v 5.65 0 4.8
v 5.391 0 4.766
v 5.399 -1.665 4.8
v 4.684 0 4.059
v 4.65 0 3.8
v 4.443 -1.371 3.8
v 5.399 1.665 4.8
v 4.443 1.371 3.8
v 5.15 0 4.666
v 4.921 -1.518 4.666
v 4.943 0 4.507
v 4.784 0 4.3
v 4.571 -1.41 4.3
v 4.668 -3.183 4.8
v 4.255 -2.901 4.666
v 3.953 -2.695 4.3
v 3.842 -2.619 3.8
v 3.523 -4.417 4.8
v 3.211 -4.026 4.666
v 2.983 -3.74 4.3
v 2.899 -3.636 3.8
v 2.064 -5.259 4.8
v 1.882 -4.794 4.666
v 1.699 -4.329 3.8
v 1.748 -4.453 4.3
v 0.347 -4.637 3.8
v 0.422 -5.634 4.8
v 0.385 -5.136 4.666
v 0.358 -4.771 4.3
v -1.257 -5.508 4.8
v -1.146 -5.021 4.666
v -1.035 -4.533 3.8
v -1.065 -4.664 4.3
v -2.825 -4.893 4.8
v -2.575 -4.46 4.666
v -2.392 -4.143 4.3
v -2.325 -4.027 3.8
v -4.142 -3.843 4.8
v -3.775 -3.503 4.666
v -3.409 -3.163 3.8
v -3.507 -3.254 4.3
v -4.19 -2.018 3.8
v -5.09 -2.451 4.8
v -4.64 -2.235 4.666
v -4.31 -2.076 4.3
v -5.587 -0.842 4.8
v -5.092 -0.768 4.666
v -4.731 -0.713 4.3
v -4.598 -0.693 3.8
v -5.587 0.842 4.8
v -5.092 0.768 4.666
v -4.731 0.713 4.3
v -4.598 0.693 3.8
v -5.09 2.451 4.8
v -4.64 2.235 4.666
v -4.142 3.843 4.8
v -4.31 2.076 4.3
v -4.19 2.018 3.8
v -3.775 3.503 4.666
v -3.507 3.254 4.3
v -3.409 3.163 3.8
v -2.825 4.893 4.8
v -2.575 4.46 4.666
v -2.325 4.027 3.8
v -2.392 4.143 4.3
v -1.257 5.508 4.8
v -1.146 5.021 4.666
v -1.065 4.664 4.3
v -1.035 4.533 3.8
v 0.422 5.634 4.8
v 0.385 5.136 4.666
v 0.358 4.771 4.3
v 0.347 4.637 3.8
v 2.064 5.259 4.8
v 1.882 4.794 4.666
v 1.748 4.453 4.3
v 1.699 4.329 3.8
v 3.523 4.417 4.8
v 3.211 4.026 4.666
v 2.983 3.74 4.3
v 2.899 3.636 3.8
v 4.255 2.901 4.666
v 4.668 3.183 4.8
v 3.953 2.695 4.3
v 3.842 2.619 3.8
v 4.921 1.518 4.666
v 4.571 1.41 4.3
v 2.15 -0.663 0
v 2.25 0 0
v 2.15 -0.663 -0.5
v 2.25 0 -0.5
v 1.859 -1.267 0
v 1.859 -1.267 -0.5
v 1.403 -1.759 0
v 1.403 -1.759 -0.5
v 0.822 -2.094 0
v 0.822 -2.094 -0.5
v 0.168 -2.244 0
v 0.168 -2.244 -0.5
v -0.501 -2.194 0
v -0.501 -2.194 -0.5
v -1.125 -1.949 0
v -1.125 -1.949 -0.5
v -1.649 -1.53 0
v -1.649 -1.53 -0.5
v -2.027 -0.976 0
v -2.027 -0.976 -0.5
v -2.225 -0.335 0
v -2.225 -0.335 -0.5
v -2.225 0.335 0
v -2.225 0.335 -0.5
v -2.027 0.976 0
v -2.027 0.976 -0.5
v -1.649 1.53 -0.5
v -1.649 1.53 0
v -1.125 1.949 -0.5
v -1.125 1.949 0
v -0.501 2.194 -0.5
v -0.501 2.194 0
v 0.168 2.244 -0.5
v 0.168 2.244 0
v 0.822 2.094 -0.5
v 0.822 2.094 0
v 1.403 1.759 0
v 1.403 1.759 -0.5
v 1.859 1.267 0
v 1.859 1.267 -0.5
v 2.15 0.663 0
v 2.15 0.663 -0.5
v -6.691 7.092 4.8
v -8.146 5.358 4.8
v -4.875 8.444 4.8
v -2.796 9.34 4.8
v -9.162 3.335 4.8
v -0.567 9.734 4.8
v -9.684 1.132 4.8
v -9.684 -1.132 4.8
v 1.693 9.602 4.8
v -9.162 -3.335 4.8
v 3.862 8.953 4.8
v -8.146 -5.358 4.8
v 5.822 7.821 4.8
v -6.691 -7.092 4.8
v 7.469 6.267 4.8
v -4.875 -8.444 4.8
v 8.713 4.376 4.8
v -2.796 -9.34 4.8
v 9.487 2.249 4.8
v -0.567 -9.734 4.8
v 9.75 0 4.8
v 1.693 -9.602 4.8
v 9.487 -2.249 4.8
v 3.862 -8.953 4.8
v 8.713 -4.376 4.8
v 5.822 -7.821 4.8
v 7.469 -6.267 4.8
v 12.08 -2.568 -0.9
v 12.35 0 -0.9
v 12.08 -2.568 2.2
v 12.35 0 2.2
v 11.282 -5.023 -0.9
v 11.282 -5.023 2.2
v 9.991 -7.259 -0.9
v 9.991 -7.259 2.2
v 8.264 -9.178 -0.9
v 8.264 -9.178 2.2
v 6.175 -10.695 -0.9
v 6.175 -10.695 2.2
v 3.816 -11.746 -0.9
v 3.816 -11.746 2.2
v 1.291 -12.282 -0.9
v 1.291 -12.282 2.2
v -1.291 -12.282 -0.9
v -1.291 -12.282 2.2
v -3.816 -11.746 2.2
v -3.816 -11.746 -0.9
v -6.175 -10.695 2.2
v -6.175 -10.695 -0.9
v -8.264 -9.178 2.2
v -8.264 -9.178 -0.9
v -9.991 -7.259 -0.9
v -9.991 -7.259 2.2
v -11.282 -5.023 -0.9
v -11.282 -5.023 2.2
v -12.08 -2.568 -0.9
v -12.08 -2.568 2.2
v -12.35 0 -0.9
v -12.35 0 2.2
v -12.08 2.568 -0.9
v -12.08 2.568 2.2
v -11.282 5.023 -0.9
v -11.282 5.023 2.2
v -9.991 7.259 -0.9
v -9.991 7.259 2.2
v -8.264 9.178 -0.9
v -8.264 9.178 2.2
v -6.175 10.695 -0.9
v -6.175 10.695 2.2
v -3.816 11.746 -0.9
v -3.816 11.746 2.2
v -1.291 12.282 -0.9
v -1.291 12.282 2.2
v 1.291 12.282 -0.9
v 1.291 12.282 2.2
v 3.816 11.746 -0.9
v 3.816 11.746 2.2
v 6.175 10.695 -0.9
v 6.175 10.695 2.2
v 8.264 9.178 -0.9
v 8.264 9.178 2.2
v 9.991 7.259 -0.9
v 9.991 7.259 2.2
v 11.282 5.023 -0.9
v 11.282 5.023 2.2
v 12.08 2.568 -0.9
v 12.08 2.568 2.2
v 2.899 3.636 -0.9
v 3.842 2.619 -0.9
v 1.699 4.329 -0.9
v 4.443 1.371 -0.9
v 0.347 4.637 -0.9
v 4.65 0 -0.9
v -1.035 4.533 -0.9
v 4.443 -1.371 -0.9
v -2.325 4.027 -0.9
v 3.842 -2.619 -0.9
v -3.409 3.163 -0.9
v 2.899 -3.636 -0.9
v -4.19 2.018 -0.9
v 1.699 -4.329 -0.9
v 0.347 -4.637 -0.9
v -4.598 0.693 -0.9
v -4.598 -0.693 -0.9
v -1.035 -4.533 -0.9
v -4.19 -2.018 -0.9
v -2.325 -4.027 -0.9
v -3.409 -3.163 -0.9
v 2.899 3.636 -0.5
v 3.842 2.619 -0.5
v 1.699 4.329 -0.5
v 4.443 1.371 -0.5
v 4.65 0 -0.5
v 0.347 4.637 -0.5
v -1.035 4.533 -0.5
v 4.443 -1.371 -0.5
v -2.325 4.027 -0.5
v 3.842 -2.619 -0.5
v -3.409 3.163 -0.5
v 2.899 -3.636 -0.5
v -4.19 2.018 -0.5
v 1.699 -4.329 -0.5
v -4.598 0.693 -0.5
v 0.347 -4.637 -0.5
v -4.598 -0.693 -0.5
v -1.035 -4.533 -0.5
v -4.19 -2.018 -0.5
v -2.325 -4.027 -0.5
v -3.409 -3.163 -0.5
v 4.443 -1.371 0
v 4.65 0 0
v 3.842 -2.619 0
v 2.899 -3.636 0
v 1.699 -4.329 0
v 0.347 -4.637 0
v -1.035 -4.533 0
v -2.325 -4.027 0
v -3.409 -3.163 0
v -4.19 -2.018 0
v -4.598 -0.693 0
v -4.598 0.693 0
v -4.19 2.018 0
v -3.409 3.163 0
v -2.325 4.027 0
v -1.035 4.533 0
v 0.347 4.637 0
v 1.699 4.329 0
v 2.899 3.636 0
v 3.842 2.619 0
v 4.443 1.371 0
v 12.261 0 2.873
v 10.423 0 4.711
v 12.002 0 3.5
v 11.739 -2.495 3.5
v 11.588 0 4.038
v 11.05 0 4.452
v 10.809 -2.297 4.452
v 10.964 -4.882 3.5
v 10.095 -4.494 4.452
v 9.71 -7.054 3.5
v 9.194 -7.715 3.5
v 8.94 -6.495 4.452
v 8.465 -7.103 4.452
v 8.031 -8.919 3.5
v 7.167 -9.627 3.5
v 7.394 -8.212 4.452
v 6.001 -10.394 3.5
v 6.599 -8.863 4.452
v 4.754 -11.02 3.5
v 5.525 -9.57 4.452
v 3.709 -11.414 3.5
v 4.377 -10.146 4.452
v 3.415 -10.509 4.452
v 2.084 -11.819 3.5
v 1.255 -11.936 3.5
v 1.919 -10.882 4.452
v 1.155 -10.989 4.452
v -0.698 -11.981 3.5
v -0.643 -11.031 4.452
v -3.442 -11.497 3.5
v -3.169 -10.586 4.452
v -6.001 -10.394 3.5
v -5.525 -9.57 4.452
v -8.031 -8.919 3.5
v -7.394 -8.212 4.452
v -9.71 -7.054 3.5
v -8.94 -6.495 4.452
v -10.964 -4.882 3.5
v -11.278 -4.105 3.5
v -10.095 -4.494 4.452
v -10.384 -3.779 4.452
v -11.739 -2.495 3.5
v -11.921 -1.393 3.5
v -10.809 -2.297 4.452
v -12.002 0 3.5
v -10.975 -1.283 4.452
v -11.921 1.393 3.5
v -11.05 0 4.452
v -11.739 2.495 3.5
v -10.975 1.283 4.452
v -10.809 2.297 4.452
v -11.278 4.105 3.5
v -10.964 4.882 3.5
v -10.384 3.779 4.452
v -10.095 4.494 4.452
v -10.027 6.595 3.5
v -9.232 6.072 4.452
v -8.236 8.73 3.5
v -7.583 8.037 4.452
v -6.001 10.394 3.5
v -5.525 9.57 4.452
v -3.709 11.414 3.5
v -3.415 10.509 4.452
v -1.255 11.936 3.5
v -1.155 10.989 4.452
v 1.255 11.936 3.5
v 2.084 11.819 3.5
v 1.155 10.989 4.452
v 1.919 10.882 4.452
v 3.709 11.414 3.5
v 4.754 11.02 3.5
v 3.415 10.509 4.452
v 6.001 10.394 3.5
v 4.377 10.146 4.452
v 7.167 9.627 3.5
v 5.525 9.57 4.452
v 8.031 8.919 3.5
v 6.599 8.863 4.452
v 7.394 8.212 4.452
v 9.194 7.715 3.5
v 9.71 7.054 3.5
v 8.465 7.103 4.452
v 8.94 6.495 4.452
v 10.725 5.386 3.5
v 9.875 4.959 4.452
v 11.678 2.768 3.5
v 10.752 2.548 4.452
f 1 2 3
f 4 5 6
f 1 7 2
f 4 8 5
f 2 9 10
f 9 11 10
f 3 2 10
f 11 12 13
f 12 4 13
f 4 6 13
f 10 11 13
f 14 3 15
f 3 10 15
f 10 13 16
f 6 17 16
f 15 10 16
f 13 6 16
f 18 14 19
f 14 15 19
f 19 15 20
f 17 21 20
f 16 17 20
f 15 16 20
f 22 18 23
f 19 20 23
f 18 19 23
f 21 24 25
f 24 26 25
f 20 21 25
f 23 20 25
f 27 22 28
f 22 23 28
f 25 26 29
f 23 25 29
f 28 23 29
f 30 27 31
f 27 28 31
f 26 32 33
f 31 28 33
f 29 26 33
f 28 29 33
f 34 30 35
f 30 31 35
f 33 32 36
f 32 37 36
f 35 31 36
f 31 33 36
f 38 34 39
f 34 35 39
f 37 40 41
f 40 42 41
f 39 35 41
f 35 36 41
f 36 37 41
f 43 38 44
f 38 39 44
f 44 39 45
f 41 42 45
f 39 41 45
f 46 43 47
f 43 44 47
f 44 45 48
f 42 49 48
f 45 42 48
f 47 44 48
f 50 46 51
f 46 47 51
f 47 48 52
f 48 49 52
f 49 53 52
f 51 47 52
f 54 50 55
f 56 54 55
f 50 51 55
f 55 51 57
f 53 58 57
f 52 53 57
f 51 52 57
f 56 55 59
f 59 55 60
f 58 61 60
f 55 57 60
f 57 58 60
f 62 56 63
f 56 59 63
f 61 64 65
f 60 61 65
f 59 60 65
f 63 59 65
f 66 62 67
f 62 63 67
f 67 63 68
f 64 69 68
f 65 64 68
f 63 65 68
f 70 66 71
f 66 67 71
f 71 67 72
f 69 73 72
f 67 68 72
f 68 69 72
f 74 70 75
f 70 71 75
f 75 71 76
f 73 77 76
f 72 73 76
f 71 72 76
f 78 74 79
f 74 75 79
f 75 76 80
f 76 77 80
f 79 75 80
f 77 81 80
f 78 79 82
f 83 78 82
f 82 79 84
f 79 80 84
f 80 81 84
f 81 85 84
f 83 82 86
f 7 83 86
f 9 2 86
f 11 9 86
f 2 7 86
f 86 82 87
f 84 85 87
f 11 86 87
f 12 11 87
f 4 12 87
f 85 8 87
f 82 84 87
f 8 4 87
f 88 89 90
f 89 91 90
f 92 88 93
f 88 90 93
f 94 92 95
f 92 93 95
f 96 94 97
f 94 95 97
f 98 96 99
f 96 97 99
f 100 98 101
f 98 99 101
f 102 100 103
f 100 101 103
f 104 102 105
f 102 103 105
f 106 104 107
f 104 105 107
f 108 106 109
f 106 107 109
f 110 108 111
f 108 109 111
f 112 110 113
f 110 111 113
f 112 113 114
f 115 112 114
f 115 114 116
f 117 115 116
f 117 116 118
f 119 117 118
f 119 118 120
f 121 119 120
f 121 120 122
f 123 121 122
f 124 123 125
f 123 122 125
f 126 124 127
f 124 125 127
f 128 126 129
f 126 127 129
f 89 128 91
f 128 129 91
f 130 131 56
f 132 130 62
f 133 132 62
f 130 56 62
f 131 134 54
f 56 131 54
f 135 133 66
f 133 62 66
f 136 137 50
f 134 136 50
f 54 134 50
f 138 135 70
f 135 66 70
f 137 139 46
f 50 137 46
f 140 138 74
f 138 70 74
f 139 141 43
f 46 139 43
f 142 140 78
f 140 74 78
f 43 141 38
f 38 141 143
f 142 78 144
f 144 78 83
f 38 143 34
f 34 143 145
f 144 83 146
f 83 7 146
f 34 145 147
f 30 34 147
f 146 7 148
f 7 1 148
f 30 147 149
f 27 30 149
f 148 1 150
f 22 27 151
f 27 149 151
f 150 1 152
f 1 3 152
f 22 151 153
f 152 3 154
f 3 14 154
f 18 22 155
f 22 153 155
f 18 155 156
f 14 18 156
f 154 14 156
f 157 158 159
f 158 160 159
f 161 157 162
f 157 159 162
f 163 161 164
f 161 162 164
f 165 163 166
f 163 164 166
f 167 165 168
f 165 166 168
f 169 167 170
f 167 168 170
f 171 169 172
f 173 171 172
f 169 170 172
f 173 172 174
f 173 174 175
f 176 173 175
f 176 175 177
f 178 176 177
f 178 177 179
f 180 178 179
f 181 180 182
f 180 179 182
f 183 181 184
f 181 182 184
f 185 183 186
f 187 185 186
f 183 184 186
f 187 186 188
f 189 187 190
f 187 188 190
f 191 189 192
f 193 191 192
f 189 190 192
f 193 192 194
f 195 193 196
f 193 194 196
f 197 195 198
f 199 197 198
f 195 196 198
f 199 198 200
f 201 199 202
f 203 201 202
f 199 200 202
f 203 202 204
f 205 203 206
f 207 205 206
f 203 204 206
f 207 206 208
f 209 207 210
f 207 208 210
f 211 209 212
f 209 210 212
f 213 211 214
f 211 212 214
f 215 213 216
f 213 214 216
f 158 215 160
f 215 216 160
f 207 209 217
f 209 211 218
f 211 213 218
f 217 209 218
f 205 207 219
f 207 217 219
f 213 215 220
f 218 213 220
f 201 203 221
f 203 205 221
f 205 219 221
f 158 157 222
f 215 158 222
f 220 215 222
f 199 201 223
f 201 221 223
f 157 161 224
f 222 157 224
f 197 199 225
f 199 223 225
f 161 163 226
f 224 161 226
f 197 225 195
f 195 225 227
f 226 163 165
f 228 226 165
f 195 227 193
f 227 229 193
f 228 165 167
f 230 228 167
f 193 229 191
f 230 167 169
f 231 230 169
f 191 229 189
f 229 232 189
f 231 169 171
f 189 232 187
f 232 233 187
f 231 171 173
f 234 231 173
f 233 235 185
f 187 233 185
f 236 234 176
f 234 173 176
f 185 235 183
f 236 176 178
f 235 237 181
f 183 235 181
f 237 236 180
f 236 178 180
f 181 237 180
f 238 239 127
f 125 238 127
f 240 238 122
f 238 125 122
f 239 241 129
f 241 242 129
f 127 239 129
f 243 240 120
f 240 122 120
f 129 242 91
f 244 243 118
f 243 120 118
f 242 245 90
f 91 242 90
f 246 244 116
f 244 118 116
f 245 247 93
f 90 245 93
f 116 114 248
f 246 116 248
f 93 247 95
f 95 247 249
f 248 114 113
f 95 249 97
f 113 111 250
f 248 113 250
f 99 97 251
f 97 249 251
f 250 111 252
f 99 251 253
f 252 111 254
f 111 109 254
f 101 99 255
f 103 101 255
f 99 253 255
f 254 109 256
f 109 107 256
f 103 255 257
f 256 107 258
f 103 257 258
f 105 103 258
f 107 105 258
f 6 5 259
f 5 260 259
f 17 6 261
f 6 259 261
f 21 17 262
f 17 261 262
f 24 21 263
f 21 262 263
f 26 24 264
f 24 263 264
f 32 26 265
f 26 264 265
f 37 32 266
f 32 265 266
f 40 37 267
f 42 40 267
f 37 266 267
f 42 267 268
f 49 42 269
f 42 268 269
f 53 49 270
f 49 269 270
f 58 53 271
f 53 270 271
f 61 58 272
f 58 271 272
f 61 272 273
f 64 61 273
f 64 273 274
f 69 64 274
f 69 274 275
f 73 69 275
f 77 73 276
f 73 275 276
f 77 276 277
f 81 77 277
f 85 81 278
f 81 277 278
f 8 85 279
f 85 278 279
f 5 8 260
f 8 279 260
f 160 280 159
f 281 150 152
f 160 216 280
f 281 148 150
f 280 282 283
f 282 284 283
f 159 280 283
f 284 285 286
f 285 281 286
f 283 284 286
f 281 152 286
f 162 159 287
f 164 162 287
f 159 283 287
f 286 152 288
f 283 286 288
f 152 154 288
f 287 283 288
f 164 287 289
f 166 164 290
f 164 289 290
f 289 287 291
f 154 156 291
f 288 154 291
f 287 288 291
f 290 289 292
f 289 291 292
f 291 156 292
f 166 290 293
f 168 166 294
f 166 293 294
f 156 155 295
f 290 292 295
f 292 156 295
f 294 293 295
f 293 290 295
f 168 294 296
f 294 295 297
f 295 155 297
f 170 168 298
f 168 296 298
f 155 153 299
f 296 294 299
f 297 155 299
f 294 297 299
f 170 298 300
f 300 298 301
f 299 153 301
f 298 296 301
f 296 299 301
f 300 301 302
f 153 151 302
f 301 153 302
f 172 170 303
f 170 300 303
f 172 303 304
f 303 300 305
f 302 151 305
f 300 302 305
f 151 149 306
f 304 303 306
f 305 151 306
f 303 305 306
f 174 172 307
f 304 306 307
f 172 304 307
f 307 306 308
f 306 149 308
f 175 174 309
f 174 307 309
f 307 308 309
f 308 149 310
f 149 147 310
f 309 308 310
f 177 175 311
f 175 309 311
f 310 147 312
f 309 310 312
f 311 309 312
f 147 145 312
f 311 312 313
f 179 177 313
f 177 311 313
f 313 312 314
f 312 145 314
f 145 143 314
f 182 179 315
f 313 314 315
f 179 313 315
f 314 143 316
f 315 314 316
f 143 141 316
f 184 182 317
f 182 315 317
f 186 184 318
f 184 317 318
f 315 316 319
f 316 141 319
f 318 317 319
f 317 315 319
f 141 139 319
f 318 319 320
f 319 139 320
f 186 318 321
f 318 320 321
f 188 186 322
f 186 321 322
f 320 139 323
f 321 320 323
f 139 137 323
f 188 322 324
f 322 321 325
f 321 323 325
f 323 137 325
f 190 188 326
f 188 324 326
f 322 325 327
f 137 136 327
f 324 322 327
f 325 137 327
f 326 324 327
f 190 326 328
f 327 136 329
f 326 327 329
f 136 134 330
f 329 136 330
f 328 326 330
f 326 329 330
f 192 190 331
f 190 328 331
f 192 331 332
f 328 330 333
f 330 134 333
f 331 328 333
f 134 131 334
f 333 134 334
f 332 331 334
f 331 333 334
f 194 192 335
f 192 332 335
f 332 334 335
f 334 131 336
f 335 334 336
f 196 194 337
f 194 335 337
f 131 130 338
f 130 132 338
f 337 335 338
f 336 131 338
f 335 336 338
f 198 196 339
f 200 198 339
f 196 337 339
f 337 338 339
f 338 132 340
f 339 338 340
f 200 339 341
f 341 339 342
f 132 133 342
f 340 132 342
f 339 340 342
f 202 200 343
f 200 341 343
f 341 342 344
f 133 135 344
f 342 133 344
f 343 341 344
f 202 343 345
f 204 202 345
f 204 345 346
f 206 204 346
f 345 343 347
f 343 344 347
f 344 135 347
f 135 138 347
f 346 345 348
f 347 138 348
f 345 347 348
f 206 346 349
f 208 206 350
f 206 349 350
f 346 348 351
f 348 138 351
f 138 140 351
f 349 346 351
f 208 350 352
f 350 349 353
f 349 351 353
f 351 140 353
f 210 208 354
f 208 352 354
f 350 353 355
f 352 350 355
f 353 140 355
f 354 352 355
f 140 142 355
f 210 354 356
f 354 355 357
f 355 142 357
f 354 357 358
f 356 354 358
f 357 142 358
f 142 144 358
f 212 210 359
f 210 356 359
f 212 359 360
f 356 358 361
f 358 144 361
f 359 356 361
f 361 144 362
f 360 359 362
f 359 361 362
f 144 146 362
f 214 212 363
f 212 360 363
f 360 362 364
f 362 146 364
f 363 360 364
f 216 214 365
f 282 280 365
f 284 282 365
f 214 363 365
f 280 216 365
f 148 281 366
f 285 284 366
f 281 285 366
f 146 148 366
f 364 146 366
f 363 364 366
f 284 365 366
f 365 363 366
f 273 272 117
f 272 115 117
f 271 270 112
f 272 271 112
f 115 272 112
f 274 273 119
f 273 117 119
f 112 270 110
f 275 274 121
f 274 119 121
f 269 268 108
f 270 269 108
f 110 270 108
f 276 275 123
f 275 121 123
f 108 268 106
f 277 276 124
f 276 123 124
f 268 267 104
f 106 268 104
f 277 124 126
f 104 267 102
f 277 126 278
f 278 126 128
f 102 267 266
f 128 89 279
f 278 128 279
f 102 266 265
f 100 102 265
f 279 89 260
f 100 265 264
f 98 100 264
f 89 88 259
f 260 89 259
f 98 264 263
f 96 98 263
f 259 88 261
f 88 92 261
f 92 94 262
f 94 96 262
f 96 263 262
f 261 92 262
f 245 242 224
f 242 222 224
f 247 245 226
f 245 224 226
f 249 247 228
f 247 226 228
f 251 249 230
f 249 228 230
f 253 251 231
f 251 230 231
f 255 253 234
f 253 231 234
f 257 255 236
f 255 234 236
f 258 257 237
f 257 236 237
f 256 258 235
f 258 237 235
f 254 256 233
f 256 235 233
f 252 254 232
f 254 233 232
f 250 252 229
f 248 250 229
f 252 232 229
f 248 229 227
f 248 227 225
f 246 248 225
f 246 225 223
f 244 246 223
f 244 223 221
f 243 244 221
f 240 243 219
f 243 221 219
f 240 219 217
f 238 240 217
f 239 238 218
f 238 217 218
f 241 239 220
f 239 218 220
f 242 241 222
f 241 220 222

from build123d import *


with BuildPart() as part:
    # Esquisse1 → Révolution1 (revolve)
    with BuildSketch(Plane(origin=(0, 0, 0), x_dir=(0, 0, -1), z_dir=(1, 0, 0)), mode=Mode.PRIVATE) as r_volution1_sk:
        with BuildLine():
            Line((0, 2.25), (0.5, 2.25))
            Line((0.5, 2.25), (0.5, 4.65))
            Line((0.5, 4.65), (0.9, 4.65))
            Line((0.9, 4.65), (0.9, 12.35))
            Line((0.9, 12.35), (-2.1, 12.35))
            Line((-2.1, 12.35), (-2.2, 12.35))
            ThreePointArc((-2.2, 12.35), (-4.038477631, 11.588477631), (-4.8, 9.75))
            Line((-4.8, 9.75), (-4.8, 5.65))
            ThreePointArc((-4.8, 5.65), (-4.507106781, 4.942893219), (-3.8, 4.65))
            Line((-3.8, 4.65), (0, 4.65))
            Line((0, 4.65), (0, 2.25))
        make_face()
    revolve(r_volution1_sk.sketch.rotate(Axis((0, 0, 13.052048193), (0, 0, -1)), 90), axis=Axis((0, 0, 13.052048193), (0, 0, -1)))


solid = part.part
